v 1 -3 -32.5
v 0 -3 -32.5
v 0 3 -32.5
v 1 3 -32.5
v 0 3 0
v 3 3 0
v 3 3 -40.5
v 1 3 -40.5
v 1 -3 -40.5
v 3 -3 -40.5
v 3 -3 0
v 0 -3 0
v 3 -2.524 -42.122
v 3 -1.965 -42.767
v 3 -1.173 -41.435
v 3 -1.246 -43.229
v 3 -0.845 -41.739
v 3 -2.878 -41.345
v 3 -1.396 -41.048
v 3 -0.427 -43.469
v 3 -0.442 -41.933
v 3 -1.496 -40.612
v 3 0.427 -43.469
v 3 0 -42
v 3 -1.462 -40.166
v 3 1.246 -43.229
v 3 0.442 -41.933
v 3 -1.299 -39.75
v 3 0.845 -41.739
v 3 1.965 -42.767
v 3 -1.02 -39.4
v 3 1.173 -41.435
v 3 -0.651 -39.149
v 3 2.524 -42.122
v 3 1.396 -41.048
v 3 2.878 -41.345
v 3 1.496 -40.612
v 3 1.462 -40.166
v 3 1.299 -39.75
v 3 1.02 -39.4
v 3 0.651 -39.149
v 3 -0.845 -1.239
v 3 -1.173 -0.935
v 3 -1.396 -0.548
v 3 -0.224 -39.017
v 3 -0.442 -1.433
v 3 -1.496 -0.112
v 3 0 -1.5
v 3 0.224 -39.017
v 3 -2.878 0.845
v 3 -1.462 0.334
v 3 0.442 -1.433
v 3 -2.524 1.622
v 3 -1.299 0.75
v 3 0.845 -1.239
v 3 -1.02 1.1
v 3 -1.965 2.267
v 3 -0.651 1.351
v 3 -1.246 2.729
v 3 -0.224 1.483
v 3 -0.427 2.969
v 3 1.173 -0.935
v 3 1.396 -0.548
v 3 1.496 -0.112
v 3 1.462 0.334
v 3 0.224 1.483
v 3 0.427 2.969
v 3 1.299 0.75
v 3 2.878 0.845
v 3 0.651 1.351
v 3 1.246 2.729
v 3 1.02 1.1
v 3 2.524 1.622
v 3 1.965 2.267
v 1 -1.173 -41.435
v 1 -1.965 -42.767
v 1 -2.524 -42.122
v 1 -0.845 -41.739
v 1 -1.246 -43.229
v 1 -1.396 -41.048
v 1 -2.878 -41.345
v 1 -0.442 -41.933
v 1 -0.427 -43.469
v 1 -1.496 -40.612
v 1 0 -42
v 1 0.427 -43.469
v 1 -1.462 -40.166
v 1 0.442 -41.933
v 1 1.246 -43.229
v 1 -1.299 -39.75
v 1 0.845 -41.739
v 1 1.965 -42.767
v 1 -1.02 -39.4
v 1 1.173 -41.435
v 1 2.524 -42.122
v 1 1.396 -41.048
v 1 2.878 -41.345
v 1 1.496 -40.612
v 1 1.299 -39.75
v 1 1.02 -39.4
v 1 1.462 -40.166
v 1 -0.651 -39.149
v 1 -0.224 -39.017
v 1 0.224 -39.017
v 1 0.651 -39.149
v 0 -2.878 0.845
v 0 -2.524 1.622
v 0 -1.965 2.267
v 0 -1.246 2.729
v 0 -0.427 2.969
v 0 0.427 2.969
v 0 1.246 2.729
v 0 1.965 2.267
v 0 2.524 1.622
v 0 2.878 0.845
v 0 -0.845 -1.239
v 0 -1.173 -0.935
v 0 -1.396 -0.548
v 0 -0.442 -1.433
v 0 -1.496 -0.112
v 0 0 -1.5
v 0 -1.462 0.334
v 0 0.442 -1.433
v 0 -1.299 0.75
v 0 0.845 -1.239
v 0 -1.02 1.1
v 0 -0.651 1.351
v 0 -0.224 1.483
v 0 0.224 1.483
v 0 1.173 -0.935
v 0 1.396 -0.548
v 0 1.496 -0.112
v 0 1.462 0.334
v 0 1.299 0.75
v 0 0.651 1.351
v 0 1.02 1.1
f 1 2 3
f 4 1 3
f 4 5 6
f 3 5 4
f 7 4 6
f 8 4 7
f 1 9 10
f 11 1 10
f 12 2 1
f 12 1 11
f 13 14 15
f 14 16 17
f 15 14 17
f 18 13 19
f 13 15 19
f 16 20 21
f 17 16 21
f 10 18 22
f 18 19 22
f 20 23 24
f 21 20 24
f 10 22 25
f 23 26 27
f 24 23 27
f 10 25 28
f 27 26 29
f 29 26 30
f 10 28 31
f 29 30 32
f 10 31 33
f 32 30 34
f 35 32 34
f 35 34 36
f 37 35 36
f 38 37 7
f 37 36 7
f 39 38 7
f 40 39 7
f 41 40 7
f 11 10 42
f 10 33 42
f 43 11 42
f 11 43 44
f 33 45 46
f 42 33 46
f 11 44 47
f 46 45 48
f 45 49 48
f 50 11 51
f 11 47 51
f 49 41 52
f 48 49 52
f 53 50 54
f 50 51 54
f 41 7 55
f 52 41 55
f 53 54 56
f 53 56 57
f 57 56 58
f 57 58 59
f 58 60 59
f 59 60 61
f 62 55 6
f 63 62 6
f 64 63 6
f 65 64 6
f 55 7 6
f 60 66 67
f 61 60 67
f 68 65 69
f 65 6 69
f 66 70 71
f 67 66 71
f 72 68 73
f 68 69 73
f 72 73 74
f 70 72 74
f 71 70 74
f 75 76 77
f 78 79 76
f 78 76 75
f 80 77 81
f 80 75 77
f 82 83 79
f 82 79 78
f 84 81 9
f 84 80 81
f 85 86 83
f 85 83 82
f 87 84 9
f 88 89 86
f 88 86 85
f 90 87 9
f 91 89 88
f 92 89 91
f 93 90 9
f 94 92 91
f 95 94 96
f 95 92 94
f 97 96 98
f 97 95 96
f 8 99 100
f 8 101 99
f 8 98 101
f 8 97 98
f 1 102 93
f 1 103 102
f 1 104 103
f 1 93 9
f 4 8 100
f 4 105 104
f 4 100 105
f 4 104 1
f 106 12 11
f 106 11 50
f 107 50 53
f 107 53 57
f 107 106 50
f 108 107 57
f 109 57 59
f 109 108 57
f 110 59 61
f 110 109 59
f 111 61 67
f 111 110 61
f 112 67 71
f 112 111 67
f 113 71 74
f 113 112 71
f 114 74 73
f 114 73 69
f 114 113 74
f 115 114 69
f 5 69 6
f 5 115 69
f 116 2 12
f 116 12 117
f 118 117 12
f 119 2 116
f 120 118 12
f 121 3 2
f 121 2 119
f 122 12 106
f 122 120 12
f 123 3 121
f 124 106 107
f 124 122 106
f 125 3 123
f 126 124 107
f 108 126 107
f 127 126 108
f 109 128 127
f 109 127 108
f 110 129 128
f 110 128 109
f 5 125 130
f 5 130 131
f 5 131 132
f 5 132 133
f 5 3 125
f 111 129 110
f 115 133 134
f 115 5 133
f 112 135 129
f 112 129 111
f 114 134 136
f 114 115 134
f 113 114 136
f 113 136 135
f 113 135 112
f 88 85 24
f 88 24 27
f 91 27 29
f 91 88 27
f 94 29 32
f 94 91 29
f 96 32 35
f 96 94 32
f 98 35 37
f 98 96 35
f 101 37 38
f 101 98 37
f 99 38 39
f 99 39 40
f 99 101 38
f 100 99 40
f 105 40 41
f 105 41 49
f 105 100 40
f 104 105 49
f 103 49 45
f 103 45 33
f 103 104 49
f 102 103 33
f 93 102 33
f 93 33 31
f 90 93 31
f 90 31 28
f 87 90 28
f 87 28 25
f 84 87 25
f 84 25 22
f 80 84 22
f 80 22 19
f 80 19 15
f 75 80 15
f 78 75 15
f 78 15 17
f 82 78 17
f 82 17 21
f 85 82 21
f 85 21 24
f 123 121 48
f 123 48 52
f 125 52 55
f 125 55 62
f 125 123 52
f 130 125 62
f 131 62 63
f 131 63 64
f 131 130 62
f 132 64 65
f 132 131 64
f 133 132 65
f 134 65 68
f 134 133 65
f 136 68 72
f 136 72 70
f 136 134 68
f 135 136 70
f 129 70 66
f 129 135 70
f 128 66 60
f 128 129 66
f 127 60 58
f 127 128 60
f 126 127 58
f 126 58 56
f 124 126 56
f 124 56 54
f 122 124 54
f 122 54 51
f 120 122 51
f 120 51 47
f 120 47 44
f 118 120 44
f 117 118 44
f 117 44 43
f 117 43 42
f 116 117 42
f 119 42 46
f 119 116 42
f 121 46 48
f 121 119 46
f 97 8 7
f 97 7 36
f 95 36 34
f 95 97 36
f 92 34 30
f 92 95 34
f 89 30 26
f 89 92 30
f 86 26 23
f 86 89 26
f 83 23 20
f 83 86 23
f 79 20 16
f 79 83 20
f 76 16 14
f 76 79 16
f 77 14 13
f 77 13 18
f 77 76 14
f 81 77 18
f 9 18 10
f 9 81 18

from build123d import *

# Parameters (mm, degrees)
SKETCH1_R           = 1.5
BOSS_EXTRUDE1_DEPTH = 3
SKETCH3_W           = 11
SKETCH3_H           = 6
CUT_EXTRUDE2_DEPTH  = 1


with BuildPart() as part:
    # Sketch1 → Boss-Extrude1 (new body)
    with BuildSketch(Plane(origin=(0, 0, 0), x_dir=(0, 0, -1), z_dir=(1, 0, 0))):
        with BuildLine():
            Line((0, 3), (40.5, 3))
            ThreePointArc((40.5, 3), (43.5, 0), (40.5, -3))
            Line((40.5, -3), (0, -3))
            ThreePointArc((0, -3), (-3, 0), (0, 3))
        make_face()
        Circle(SKETCH1_R, mode=Mode.SUBTRACT)
        with Locations((40.5, 0)):
            Circle(SKETCH1_R, mode=Mode.SUBTRACT)
    extrude(amount=BOSS_EXTRUDE1_DEPTH)

    # Sketch3 → Cut-Extrude2 (cut)
    with BuildSketch(Plane.ZY):
        with Locations((-38, 0)):
            Rectangle(SKETCH3_W, SKETCH3_H)
    extrude(amount=-CUT_EXTRUDE2_DEPTH, mode=Mode.SUBTRACT)


solid = part.part
